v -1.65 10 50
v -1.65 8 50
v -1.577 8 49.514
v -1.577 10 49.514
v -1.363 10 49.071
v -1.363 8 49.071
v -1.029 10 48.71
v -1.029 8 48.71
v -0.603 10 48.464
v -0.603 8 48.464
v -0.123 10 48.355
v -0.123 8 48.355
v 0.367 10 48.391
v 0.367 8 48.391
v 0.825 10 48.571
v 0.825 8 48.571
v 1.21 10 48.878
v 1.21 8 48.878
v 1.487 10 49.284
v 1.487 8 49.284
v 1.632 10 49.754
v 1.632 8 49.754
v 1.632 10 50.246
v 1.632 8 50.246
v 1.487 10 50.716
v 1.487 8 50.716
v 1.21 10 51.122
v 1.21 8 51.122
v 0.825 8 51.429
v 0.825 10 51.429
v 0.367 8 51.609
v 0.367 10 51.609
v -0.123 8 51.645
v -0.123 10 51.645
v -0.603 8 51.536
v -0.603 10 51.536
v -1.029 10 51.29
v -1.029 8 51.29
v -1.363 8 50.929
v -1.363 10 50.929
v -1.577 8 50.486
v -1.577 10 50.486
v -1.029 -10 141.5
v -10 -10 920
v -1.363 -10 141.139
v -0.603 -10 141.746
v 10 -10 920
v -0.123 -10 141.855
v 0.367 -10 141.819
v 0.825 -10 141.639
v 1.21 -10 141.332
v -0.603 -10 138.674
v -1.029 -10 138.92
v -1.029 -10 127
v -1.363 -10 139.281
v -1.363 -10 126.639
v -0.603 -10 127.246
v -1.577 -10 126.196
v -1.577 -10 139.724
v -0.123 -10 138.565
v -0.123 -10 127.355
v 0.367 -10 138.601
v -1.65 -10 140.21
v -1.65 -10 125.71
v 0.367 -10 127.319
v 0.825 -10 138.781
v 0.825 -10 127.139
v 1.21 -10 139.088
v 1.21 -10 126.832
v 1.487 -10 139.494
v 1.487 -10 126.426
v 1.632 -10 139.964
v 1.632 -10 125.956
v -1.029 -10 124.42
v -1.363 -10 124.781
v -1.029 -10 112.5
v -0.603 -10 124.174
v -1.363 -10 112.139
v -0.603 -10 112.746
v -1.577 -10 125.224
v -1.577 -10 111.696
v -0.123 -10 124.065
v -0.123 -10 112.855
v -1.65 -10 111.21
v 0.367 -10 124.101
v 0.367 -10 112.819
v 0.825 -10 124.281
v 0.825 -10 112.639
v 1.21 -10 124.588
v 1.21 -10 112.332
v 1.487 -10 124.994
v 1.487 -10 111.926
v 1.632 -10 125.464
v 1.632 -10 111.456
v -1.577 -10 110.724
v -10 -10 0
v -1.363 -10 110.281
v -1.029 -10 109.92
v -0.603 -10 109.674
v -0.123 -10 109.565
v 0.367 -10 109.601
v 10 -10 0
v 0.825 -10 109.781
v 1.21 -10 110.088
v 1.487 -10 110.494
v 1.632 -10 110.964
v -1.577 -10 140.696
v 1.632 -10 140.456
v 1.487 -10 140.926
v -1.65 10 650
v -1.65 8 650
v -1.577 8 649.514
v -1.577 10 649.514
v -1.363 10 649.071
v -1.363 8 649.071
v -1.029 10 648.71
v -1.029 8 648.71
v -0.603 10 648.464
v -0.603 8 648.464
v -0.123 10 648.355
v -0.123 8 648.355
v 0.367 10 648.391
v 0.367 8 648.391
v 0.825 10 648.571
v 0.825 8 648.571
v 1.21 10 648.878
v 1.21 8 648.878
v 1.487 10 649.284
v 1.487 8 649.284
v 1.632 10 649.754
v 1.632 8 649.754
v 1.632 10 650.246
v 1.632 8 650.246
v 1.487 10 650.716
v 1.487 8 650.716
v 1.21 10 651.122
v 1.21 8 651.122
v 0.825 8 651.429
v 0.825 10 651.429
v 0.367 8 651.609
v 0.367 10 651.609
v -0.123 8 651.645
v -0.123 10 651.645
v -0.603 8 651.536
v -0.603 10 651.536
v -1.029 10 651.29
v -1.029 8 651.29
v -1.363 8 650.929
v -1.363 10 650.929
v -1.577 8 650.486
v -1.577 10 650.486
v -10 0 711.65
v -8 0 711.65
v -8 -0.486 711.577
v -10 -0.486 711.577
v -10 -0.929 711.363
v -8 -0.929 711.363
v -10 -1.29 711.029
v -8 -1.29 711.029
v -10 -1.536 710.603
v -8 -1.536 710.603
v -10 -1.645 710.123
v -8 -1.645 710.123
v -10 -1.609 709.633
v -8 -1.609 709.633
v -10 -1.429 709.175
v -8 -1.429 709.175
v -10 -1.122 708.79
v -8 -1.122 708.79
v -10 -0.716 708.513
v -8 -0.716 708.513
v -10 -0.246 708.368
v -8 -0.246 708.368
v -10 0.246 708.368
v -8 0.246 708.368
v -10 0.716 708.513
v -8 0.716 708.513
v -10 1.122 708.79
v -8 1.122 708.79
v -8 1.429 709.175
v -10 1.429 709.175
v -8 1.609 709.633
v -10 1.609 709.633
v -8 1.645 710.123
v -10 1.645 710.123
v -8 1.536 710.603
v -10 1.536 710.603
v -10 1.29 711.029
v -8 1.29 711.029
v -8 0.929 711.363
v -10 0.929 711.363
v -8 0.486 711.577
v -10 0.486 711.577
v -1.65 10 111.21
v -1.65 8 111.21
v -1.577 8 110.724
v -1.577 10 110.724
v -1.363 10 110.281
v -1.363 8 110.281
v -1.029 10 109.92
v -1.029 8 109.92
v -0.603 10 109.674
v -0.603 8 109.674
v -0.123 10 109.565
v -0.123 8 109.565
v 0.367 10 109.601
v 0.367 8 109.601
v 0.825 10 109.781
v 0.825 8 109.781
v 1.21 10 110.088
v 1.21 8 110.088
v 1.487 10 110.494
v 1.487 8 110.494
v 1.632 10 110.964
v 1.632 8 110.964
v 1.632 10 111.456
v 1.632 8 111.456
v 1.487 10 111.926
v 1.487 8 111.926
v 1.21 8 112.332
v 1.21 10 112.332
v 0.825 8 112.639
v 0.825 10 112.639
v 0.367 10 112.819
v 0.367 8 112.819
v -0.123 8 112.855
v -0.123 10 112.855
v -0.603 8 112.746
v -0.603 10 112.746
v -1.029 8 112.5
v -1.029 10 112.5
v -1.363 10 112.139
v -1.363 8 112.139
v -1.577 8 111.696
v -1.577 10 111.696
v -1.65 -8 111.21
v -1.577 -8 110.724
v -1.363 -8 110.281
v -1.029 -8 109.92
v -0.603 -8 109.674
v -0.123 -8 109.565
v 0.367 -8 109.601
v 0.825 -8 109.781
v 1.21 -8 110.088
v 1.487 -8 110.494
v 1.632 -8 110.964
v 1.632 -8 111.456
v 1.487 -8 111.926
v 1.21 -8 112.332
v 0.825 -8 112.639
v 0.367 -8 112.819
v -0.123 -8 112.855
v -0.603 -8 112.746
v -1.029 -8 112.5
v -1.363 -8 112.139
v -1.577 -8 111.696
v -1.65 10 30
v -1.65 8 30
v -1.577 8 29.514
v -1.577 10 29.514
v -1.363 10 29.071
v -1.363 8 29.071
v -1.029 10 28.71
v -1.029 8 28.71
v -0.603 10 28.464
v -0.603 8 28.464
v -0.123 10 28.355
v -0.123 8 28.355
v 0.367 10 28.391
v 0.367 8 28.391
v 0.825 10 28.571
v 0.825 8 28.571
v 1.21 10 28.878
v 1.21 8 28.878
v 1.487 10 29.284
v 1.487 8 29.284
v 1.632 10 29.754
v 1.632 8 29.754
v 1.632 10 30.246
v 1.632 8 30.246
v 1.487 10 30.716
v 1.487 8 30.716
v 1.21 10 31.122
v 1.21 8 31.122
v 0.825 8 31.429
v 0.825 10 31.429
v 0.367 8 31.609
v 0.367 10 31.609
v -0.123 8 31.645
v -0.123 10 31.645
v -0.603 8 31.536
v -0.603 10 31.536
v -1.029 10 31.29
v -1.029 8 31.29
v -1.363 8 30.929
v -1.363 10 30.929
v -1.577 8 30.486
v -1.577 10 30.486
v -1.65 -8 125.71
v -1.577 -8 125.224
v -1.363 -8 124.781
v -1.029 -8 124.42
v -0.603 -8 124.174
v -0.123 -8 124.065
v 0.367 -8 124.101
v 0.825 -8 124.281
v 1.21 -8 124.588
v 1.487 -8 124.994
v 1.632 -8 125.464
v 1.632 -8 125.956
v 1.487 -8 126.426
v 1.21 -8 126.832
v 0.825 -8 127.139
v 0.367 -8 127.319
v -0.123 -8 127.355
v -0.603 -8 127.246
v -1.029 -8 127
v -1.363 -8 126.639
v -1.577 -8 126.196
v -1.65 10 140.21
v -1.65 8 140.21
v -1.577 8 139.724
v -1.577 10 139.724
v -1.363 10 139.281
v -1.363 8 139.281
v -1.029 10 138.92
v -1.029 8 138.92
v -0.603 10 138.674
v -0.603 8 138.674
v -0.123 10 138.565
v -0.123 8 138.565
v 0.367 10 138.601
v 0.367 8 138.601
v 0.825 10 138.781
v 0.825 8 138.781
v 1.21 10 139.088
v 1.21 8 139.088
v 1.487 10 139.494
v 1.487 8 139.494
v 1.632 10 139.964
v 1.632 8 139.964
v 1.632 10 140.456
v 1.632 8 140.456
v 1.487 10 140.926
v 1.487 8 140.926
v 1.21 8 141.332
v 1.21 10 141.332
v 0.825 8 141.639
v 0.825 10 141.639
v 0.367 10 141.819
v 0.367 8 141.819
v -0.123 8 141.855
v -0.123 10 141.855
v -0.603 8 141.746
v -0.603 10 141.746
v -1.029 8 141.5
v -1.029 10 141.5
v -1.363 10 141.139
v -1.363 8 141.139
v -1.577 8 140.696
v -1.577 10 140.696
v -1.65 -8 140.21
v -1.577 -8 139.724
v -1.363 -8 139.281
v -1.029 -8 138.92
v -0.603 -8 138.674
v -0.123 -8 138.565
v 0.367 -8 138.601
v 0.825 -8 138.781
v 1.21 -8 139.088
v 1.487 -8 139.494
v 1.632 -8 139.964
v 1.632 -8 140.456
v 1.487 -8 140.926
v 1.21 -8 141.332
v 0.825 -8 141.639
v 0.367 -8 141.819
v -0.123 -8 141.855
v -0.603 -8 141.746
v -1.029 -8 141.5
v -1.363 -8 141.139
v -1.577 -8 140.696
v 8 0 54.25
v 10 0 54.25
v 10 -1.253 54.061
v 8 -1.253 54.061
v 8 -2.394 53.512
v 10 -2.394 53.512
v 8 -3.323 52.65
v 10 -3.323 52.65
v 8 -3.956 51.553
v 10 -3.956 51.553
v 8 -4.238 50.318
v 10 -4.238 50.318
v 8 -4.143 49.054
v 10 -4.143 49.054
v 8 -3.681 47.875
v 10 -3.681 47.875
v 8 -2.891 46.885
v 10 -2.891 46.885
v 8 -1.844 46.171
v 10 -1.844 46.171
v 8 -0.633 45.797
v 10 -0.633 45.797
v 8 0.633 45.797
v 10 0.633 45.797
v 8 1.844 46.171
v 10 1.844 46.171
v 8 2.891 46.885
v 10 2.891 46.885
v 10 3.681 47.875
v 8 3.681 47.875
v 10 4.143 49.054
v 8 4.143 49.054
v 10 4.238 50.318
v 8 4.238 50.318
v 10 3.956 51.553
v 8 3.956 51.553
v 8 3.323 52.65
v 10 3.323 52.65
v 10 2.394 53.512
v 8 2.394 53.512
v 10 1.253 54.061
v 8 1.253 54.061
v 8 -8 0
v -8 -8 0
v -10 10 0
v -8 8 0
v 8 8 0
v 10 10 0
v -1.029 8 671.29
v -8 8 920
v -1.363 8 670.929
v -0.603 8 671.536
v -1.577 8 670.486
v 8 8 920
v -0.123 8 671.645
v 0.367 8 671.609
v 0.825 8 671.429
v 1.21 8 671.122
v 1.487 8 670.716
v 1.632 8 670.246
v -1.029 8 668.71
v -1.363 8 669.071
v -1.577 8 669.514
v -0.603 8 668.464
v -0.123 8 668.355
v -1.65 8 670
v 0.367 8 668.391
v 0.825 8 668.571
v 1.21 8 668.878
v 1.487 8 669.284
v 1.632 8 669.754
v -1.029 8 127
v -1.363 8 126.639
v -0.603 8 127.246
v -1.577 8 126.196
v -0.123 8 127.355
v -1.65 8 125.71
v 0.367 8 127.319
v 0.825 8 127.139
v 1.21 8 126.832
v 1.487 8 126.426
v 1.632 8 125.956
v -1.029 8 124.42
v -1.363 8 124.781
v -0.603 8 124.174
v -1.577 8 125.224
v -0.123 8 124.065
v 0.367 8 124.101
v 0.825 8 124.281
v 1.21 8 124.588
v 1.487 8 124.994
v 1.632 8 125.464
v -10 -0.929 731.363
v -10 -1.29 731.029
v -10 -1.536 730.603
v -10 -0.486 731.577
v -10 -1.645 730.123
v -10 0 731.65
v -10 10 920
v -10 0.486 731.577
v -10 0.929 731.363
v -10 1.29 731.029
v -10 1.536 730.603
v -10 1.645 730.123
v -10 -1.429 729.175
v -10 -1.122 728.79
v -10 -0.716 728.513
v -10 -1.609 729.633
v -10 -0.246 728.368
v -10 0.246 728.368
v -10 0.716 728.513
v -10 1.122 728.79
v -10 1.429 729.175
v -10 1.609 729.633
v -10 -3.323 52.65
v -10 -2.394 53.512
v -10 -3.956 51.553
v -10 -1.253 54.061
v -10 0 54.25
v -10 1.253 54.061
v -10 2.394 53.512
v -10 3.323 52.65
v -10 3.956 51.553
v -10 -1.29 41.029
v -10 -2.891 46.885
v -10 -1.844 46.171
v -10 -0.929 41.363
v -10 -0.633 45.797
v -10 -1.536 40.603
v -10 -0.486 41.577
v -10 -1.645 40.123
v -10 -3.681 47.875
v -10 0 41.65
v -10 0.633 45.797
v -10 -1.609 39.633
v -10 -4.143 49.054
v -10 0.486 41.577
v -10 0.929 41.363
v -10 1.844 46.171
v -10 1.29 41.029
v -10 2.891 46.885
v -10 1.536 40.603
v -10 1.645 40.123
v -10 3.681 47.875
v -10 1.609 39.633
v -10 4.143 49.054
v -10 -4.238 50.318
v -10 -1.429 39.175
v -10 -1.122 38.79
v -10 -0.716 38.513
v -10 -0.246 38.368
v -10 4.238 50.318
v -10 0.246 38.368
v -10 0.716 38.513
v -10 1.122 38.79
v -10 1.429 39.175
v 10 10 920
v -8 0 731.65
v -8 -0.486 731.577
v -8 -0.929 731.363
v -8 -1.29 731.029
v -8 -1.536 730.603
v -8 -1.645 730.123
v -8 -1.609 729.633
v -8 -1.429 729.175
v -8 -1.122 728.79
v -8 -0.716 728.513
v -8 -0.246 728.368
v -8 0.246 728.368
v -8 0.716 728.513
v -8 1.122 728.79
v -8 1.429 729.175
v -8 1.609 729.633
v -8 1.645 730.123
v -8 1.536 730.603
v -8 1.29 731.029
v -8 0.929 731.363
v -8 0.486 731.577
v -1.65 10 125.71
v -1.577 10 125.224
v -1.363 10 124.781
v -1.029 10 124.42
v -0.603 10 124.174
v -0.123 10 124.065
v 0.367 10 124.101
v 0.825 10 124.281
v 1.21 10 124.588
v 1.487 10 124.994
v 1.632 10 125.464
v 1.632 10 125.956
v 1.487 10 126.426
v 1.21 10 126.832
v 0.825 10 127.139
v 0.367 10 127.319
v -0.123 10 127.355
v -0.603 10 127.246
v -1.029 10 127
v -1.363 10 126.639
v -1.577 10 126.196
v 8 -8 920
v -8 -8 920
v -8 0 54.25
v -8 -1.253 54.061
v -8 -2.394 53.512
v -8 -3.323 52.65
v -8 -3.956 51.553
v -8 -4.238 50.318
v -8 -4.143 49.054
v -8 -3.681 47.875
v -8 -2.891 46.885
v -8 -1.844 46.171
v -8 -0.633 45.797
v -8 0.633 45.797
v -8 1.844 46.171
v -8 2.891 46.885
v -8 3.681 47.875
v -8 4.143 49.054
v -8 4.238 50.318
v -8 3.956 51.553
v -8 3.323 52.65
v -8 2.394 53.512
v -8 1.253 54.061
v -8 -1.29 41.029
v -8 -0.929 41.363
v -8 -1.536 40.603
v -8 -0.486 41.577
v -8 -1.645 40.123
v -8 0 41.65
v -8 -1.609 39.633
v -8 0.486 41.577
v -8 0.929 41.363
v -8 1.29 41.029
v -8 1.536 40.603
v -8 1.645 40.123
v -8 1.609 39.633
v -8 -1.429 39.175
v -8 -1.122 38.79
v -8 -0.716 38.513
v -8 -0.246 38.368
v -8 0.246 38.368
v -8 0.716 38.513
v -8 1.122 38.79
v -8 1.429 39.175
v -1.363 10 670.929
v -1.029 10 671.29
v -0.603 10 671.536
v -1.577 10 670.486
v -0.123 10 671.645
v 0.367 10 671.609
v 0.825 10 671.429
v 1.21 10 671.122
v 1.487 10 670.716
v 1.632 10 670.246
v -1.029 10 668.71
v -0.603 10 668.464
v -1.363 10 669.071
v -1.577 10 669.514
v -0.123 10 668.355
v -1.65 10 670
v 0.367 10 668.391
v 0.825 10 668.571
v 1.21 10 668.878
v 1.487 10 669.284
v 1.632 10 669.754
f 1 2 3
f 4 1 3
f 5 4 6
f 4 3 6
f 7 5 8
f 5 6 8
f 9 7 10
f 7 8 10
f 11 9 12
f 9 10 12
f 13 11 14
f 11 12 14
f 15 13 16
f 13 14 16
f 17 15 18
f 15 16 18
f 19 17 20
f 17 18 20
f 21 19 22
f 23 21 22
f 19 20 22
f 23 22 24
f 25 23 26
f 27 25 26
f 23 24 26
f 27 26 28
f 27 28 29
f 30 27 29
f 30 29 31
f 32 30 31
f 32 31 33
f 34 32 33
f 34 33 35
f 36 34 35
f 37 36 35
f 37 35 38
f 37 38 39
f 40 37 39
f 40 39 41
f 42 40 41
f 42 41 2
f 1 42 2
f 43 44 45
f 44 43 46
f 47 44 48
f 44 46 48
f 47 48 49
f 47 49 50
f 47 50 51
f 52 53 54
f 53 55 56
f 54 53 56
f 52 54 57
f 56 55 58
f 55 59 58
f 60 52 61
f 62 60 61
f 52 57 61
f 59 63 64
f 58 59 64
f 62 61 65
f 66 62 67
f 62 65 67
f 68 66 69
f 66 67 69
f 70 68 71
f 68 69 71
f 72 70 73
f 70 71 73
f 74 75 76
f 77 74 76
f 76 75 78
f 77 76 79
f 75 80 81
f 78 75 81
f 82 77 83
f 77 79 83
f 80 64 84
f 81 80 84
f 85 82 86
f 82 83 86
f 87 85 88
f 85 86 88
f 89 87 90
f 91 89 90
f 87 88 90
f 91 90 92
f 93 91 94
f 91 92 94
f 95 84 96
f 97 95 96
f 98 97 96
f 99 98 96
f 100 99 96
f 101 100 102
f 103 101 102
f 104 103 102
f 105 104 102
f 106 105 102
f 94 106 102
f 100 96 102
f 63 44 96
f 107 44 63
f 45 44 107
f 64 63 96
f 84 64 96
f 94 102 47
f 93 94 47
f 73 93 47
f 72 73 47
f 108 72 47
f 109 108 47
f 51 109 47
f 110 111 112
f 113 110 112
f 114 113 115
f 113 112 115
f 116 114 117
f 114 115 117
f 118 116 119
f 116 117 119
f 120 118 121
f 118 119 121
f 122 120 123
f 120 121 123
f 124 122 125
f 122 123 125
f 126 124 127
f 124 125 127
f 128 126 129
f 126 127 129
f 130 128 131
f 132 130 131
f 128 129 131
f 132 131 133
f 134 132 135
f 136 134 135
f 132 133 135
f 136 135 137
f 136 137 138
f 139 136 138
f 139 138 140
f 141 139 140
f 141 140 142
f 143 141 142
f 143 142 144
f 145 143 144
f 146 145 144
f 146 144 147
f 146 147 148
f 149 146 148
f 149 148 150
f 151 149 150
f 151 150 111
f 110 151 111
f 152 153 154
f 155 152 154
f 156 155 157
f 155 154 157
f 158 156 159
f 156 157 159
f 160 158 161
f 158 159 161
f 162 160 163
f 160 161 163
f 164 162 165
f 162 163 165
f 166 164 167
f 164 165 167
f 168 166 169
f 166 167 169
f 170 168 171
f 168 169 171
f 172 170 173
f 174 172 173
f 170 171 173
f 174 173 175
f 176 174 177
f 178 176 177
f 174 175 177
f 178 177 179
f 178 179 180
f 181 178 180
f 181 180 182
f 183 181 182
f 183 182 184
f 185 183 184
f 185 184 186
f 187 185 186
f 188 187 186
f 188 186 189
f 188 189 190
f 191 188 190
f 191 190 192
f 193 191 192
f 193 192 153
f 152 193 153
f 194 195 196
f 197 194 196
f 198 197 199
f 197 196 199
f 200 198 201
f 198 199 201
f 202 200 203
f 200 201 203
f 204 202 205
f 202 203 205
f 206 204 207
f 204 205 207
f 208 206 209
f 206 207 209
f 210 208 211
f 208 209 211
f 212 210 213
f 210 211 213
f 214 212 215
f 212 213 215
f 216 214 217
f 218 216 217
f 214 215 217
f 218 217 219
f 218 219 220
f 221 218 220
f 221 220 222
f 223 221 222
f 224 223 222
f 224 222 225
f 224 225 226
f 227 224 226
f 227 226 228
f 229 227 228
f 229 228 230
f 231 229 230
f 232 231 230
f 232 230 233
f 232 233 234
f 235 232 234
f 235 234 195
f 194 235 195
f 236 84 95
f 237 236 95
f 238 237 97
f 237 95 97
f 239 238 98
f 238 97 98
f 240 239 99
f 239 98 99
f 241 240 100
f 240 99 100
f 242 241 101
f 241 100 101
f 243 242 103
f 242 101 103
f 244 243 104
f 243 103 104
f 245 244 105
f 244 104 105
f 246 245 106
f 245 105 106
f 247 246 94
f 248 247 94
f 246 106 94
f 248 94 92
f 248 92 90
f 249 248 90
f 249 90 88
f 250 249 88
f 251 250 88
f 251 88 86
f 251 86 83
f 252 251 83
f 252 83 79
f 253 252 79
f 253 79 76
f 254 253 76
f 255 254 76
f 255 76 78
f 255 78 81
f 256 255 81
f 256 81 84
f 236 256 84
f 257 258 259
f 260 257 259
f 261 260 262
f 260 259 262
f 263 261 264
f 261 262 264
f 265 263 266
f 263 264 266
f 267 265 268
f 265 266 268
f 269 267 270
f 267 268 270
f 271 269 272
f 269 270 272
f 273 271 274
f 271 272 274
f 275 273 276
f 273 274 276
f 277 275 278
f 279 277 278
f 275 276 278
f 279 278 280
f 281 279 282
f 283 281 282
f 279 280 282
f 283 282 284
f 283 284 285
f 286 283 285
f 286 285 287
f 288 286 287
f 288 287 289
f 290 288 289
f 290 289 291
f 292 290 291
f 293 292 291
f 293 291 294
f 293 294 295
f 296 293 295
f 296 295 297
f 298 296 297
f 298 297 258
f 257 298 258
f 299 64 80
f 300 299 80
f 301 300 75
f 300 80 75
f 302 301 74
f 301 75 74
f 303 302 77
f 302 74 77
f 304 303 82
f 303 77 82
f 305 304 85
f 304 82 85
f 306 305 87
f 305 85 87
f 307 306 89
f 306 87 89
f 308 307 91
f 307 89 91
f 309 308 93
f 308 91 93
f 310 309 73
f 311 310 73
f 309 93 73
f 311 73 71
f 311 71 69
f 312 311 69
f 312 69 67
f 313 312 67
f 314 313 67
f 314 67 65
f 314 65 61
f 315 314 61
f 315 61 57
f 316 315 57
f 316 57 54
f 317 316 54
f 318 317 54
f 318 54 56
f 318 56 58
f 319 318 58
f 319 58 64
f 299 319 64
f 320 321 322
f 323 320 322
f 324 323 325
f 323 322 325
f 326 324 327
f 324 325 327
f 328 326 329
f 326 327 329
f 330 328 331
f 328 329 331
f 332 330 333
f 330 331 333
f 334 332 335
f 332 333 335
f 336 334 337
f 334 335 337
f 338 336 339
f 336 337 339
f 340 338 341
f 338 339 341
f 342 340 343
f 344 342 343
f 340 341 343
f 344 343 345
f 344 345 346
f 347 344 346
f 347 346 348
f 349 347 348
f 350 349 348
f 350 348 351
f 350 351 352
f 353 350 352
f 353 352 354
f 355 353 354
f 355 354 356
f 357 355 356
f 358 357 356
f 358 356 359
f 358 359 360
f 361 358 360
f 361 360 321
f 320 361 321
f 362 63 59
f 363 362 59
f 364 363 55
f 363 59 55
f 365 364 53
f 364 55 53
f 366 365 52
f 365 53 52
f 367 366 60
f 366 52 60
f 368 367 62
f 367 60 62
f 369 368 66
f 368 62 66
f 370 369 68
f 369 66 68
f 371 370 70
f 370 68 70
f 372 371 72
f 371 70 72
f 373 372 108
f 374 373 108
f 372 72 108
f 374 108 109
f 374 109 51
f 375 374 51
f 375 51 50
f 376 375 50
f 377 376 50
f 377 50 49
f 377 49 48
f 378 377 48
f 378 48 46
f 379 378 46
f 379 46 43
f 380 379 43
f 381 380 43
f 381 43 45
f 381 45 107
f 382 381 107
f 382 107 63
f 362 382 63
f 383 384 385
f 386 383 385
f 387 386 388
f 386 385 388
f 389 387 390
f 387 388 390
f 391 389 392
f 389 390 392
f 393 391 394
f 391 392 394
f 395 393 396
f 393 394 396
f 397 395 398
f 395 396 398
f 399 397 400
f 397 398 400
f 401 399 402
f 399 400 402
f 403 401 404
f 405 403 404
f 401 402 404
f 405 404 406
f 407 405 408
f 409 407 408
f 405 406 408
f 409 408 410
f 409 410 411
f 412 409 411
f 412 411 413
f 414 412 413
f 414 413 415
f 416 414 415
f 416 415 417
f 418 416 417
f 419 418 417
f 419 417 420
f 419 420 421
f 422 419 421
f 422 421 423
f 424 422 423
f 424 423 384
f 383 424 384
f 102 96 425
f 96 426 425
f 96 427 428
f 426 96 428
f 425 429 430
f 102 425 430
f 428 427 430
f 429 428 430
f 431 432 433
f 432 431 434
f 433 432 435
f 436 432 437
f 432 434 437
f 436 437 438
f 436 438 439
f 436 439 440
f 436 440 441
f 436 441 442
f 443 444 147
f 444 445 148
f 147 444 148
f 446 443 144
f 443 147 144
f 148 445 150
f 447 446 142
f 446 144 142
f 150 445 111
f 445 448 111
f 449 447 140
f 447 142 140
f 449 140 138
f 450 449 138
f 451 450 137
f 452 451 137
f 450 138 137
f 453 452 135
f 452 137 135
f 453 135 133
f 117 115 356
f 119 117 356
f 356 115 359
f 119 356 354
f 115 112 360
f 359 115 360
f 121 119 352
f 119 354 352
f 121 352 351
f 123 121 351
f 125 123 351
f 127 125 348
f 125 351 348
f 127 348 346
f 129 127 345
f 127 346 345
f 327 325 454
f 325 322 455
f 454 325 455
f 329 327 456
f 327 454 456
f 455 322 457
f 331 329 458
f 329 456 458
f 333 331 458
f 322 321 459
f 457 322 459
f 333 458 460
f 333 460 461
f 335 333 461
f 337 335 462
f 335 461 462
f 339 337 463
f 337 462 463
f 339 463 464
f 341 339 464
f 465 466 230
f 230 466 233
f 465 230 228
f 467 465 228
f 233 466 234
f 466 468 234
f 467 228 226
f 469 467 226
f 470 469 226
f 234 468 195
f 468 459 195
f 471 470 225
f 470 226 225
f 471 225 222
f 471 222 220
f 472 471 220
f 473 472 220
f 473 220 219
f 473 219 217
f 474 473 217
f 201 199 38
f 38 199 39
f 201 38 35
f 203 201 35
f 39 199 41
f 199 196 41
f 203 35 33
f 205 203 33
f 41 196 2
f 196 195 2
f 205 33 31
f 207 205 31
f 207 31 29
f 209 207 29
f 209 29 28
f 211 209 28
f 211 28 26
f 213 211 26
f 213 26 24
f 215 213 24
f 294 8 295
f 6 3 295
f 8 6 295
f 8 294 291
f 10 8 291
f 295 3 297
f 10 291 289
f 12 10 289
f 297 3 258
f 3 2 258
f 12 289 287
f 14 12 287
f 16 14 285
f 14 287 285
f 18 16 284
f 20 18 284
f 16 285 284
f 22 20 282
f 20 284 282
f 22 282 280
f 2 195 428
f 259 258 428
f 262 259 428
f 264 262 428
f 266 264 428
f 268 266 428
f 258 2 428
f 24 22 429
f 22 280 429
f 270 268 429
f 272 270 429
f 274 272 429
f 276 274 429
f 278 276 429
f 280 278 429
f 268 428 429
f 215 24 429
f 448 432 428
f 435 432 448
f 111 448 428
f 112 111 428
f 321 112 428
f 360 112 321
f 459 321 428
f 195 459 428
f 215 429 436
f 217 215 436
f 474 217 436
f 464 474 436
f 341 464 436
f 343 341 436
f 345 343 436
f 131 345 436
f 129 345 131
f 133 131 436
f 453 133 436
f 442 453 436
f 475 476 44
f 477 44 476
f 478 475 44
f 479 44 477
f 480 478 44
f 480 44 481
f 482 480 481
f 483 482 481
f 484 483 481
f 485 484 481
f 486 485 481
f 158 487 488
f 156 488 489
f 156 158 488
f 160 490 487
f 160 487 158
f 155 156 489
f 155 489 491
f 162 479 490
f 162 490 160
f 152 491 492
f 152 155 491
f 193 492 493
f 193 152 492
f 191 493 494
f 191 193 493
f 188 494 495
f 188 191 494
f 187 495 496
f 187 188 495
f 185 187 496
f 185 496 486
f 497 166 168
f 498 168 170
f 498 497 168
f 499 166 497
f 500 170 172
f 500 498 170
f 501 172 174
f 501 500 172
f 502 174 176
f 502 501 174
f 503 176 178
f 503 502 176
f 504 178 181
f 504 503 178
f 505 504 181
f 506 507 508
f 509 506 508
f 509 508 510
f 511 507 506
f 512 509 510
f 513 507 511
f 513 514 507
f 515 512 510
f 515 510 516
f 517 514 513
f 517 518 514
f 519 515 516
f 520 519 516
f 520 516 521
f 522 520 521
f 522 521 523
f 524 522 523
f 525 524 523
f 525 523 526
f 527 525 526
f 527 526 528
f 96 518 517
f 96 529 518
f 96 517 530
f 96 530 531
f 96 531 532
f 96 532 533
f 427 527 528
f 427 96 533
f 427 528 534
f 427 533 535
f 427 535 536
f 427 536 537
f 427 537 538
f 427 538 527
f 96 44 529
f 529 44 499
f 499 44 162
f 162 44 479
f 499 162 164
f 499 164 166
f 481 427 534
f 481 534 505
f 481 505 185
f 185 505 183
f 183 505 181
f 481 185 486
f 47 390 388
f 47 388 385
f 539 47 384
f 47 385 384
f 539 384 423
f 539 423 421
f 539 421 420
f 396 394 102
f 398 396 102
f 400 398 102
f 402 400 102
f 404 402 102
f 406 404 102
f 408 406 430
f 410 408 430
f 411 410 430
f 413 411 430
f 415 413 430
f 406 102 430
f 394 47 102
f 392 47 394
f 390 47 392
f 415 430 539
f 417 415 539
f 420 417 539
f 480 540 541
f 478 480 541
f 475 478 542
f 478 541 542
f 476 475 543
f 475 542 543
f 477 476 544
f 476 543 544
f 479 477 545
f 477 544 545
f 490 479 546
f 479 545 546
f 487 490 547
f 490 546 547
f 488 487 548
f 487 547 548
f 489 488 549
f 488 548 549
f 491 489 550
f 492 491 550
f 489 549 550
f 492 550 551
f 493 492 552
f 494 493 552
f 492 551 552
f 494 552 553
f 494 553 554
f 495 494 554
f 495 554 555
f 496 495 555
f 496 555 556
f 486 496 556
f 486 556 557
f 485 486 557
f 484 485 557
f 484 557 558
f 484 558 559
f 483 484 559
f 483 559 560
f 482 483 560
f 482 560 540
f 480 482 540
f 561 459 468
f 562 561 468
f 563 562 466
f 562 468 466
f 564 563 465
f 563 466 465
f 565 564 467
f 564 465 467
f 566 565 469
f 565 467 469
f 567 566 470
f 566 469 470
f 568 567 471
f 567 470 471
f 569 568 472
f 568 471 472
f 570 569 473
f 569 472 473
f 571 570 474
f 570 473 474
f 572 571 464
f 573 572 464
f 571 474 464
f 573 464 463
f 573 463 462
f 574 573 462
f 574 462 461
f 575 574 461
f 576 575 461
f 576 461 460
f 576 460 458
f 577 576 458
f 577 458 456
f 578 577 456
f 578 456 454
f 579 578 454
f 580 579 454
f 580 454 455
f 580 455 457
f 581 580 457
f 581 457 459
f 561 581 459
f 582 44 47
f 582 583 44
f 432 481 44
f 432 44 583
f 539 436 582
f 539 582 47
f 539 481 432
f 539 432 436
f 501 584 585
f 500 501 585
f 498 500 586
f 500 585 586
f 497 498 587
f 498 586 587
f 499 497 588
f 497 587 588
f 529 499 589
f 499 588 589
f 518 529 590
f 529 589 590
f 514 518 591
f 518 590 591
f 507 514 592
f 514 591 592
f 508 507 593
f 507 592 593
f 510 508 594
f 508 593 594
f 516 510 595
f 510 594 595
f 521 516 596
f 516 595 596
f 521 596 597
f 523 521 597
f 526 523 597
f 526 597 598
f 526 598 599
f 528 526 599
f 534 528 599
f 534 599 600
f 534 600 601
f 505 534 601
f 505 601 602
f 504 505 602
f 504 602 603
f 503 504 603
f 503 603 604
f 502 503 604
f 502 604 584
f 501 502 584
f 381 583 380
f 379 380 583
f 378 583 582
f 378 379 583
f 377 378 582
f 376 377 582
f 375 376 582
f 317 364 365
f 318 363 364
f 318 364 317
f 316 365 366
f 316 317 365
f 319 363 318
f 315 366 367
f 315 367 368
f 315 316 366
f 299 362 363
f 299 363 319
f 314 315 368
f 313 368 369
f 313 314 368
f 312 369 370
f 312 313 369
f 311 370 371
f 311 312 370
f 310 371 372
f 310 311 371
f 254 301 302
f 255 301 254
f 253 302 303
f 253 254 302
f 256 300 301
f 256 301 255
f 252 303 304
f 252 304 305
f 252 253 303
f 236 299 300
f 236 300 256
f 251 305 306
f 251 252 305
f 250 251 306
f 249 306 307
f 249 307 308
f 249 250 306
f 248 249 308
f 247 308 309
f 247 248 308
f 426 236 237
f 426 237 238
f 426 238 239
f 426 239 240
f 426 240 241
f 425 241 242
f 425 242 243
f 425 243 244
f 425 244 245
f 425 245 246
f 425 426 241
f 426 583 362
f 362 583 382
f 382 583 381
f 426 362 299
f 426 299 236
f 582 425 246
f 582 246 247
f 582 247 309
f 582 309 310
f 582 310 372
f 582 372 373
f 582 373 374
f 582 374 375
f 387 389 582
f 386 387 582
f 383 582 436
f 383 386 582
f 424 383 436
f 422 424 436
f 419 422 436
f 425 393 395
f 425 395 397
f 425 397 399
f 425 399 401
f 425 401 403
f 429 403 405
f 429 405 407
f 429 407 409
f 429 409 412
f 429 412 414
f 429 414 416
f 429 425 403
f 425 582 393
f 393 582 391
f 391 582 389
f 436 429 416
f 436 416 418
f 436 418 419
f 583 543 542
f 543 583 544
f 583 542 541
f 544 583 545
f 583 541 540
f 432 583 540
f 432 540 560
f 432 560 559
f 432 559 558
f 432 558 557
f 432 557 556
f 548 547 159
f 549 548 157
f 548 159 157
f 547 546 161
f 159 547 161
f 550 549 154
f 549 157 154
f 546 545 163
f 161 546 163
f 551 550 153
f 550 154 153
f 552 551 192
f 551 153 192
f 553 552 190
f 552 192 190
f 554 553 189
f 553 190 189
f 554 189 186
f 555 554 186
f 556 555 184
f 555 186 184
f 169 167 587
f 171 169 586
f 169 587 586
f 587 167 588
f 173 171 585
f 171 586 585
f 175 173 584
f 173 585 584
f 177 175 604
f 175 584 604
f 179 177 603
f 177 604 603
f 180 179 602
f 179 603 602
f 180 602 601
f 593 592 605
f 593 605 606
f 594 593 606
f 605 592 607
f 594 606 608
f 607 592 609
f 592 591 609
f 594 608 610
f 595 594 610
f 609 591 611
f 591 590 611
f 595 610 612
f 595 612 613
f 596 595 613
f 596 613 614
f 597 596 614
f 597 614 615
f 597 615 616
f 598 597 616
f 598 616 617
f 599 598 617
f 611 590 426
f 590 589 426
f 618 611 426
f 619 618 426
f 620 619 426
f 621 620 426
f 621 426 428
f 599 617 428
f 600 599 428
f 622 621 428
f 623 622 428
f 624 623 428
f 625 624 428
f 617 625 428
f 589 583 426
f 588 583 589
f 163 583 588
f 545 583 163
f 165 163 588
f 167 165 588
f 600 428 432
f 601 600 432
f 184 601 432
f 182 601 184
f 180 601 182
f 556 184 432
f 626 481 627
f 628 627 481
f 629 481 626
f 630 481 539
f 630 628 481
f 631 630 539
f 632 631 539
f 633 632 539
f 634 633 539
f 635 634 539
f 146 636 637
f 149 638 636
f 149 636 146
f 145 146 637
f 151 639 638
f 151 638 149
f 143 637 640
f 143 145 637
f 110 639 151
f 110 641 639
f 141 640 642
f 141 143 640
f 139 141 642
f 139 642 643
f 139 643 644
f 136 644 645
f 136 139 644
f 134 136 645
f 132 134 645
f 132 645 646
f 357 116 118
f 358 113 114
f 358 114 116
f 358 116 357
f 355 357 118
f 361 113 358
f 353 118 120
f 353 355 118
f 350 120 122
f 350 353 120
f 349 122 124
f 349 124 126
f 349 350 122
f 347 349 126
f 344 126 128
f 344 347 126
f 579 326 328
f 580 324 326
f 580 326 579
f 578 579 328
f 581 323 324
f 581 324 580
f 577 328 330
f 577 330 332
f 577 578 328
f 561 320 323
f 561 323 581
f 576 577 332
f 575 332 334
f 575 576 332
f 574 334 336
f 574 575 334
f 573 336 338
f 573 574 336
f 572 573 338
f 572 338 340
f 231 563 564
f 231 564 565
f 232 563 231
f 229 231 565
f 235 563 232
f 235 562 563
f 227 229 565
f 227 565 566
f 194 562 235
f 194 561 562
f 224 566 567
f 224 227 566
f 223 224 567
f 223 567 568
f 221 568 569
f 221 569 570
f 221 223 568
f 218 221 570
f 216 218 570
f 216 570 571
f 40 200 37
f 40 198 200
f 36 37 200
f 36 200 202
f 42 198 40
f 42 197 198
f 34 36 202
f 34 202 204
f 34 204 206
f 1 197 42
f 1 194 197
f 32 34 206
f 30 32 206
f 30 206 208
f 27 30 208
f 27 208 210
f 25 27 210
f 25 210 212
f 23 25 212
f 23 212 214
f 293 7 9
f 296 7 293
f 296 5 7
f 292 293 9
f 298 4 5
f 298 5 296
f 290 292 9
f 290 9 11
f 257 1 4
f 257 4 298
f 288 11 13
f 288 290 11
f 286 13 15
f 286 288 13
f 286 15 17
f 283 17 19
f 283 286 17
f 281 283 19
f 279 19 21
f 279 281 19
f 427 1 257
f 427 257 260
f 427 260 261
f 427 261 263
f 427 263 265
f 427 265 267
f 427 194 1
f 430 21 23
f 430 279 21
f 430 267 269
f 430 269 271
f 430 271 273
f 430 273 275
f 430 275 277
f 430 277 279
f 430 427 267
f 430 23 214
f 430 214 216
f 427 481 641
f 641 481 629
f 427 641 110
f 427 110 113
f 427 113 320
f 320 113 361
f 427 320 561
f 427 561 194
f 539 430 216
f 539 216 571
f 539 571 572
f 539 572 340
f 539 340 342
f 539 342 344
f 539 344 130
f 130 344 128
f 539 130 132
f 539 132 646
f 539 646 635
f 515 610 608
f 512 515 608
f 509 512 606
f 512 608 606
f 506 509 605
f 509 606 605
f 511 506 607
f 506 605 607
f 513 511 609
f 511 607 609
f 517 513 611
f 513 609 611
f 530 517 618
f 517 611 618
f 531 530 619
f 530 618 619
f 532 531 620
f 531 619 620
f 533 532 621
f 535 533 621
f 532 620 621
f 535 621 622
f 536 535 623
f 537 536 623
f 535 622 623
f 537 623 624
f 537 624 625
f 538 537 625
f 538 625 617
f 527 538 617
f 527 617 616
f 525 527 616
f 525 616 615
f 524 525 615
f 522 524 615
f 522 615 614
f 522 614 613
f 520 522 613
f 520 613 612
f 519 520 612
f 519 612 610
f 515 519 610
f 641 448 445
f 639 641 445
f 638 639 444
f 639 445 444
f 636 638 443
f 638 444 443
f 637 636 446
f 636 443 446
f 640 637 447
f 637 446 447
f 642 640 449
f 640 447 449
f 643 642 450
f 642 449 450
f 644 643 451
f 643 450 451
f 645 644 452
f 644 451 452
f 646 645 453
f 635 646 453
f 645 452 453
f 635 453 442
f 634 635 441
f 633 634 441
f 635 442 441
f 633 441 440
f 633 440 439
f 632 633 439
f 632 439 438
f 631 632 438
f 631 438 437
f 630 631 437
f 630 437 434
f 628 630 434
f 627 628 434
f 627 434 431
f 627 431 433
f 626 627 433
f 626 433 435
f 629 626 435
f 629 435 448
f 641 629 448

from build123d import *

# Parameters (mm, degrees)
SKETCH_1_W           = 20
SKETCH_1_H           = 20
SKETCH_1_W_2         = 16
SKETCH_1_H_2         = 16
EXTRUDE_1_DEPTH      = 970
CUT_EXTRUDE_1_DEPTH  = 20
CUT_EXTRUDE_2_DEPTH  = 10
SKETCH_6_W           = 27.825743136
SKETCH_6_H           = 21.841712354
CUT_EXTRUDE_8_DEPTH  = 50
SKETCH_9_R           = 1
CUT_EXTRUDE_9_DEPTH  = 10
M4X0_7_3_D           = 3.3
M4X0_7_2_D           = 3.3
M4X0_7_7_D           = 3.3
M4X0_7_7_DEPTH       = 11.5
M4X0_7_7_TIP         = 0.991420021
M4X0_7_9_D           = 3.3
M4X0_7_9_DEPTH       = 11.5
M4X0_7_9_TIP         = 0.991420021
SKETCH_26_R          = 1
CUT_EXTRUDE_10_DEPTH = 10
M4X0_7_10_D          = 3.3
M4X0_7_10_DEPTH      = 11.5
M4X0_7_10_TIP        = 0.991420021


with BuildPart() as part:
    # ｽｹｯﾁ1 → ﾎﾞｽ - 押し出し1 (new body)
    with BuildSketch(Plane.XY):
        Rectangle(SKETCH_1_W, SKETCH_1_H)
        Rectangle(SKETCH_1_W_2, SKETCH_1_H_2, mode=Mode.SUBTRACT)
    extrude(amount=EXTRUDE_1_DEPTH)

    # ｽｹｯﾁ2 → ｶｯﾄ - 押し出し1 (cut)
    with BuildSketch(Plane(origin=(10, 0, 0), x_dir=(0, 0, -1), z_dir=(1, 0, 0))):
        with BuildLine():
            ThreePointArc((-45.75, 0), (-50, 4.25), (-54.25, 0))
            Line((-54.25, 0), (-50, 0))
            Line((-50, 0), (-45.75, 0))
        make_face()
        with BuildLine():
            Line((-50, 0), (-54.25, 0))
            ThreePointArc((-54.25, 0), (-50, -4.25), (-45.75, 0))
            Line((-45.75, 0), (-50, 0))
        make_face()
    extrude(amount=-CUT_EXTRUDE_1_DEPTH, mode=Mode.SUBTRACT)

    # ｽｹｯﾁ3 → ｶｯﾄ - 押し出し2 (cut)
    with BuildSketch(Plane(origin=(0, 10, 0), x_dir=(1, 0, 0), z_dir=(0, 1, 0))):
        with BuildLine():
            ThreePointArc((0, -649), (-1, -650), (0, -651))
            Line((0, -651), (0, -650))
            Line((0, -650), (0, -649))
        make_face()
        with BuildLine():
            Line((0, -650), (0, -651))
            ThreePointArc((0, -651), (0.707106781, -650.707106781), (1, -650))
            ThreePointArc((1, -650), (0.707106781, -649.292893219), (0, -649))
            Line((0, -649), (0, -650))
        make_face()
        with BuildLine():
            ThreePointArc((0, -669), (-1, -670), (0, -671))
            Line((0, -671), (0, -670))
            Line((0, -670), (0, -669))
        make_face()
        with BuildLine():
            Line((0, -670), (0, -671))
            ThreePointArc((0, -671), (0.707106781, -670.707106781), (1, -670))
            ThreePointArc((1, -670), (0.707106781, -669.292893219), (0, -669))
            Line((0, -669), (0, -670))
        make_face()
    extrude(amount=-CUT_EXTRUDE_2_DEPTH, mode=Mode.SUBTRACT)

    # ｽｹｯﾁ6 → ｶｯﾄ - 押し出し8 (cut)
    with BuildSketch(Plane.XY.offset(970)):
        Rectangle(SKETCH_6_W, SKETCH_6_H)
    extrude(amount=-CUT_EXTRUDE_8_DEPTH, mode=Mode.SUBTRACT)

    # ｽｹｯﾁ9 → ｶｯﾄ - 押し出し9 (cut)
    with BuildSketch(Plane(origin=(0, 10, 0), x_dir=(1, 0, 0), z_dir=(0, 1, 0))):
        with Locations((0, -30)):
            Circle(SKETCH_9_R)
        with Locations((0, -50)):
            Circle(SKETCH_9_R)
    extrude(amount=-CUT_EXTRUDE_9_DEPTH, mode=Mode.SUBTRACT)

    # M4x0.7 ねじ穴3 (through all)
    with Locations(Plane(origin=(0, 10, 111.21), x_dir=(1, 0, 0), z_dir=(0, 1, 0))):
        with Locations((0, 0), (0, -29)):
            Hole(M4X0_7_3_D / 2)

    # M4x0.7 ねじ穴2 (through all)
    with Locations(Plane(origin=(0, 10, 125.71), x_dir=(1, 0, 0), z_dir=(0, 1, 0))):
        with Locations((0, 0)):
            Hole(M4X0_7_2_D / 2)

    # M4x0.7 ねじ穴7
    with Locations(Plane(origin=(0, 10, 650), x_dir=(1, 0, 0), z_dir=(0, 1, 0))):
        with Locations((0, 0), (0, -20)):
            Hole(M4X0_7_7_D / 2, depth=M4X0_7_7_DEPTH)
            with Locations((0, 0, -(M4X0_7_7_DEPTH + M4X0_7_7_TIP / 2))):  # 118° drill point
                Cone(0, M4X0_7_7_D / 2, M4X0_7_7_TIP, mode=Mode.SUBTRACT)

    # M4x0.7 ねじ穴9
    with Locations(Plane(origin=(0, 10, 30), x_dir=(1, 0, 0), z_dir=(0, 1, 0))):
        with Locations((0, 0), (0, -20)):
            Hole(M4X0_7_9_D / 2, depth=M4X0_7_9_DEPTH)
            with Locations((0, 0, -(M4X0_7_9_DEPTH + M4X0_7_9_TIP / 2))):  # 118° drill point
                Cone(0, M4X0_7_9_D / 2, M4X0_7_9_TIP, mode=Mode.SUBTRACT)

    # ｽｹｯﾁ26 → ｶｯﾄ - 押し出し10 (cut)
    with BuildSketch(Plane.ZY.offset(10)):
        with Locations((40, 0)):
            Circle(SKETCH_26_R)
        with Locations((710, 0)):
            Circle(SKETCH_26_R)
        with Locations((730, 0)):
            Circle(SKETCH_26_R)
    extrude(amount=-CUT_EXTRUDE_10_DEPTH, mode=Mode.SUBTRACT)

    # M4x0.7 ねじ穴10
    with Locations(Plane(origin=(-10, 0, 730), x_dir=(0, 0, -1), z_dir=(-1, 0, 0))):
        with Locations((0, 0), (20, 0), (690, 0)):
            Hole(M4X0_7_10_D / 2, depth=M4X0_7_10_DEPTH)
            with Locations((0, 0, -(M4X0_7_10_DEPTH + M4X0_7_10_TIP / 2))):  # 118° drill point
                Cone(0, M4X0_7_10_D / 2, M4X0_7_10_TIP, mode=Mode.SUBTRACT)


solid = part.part
